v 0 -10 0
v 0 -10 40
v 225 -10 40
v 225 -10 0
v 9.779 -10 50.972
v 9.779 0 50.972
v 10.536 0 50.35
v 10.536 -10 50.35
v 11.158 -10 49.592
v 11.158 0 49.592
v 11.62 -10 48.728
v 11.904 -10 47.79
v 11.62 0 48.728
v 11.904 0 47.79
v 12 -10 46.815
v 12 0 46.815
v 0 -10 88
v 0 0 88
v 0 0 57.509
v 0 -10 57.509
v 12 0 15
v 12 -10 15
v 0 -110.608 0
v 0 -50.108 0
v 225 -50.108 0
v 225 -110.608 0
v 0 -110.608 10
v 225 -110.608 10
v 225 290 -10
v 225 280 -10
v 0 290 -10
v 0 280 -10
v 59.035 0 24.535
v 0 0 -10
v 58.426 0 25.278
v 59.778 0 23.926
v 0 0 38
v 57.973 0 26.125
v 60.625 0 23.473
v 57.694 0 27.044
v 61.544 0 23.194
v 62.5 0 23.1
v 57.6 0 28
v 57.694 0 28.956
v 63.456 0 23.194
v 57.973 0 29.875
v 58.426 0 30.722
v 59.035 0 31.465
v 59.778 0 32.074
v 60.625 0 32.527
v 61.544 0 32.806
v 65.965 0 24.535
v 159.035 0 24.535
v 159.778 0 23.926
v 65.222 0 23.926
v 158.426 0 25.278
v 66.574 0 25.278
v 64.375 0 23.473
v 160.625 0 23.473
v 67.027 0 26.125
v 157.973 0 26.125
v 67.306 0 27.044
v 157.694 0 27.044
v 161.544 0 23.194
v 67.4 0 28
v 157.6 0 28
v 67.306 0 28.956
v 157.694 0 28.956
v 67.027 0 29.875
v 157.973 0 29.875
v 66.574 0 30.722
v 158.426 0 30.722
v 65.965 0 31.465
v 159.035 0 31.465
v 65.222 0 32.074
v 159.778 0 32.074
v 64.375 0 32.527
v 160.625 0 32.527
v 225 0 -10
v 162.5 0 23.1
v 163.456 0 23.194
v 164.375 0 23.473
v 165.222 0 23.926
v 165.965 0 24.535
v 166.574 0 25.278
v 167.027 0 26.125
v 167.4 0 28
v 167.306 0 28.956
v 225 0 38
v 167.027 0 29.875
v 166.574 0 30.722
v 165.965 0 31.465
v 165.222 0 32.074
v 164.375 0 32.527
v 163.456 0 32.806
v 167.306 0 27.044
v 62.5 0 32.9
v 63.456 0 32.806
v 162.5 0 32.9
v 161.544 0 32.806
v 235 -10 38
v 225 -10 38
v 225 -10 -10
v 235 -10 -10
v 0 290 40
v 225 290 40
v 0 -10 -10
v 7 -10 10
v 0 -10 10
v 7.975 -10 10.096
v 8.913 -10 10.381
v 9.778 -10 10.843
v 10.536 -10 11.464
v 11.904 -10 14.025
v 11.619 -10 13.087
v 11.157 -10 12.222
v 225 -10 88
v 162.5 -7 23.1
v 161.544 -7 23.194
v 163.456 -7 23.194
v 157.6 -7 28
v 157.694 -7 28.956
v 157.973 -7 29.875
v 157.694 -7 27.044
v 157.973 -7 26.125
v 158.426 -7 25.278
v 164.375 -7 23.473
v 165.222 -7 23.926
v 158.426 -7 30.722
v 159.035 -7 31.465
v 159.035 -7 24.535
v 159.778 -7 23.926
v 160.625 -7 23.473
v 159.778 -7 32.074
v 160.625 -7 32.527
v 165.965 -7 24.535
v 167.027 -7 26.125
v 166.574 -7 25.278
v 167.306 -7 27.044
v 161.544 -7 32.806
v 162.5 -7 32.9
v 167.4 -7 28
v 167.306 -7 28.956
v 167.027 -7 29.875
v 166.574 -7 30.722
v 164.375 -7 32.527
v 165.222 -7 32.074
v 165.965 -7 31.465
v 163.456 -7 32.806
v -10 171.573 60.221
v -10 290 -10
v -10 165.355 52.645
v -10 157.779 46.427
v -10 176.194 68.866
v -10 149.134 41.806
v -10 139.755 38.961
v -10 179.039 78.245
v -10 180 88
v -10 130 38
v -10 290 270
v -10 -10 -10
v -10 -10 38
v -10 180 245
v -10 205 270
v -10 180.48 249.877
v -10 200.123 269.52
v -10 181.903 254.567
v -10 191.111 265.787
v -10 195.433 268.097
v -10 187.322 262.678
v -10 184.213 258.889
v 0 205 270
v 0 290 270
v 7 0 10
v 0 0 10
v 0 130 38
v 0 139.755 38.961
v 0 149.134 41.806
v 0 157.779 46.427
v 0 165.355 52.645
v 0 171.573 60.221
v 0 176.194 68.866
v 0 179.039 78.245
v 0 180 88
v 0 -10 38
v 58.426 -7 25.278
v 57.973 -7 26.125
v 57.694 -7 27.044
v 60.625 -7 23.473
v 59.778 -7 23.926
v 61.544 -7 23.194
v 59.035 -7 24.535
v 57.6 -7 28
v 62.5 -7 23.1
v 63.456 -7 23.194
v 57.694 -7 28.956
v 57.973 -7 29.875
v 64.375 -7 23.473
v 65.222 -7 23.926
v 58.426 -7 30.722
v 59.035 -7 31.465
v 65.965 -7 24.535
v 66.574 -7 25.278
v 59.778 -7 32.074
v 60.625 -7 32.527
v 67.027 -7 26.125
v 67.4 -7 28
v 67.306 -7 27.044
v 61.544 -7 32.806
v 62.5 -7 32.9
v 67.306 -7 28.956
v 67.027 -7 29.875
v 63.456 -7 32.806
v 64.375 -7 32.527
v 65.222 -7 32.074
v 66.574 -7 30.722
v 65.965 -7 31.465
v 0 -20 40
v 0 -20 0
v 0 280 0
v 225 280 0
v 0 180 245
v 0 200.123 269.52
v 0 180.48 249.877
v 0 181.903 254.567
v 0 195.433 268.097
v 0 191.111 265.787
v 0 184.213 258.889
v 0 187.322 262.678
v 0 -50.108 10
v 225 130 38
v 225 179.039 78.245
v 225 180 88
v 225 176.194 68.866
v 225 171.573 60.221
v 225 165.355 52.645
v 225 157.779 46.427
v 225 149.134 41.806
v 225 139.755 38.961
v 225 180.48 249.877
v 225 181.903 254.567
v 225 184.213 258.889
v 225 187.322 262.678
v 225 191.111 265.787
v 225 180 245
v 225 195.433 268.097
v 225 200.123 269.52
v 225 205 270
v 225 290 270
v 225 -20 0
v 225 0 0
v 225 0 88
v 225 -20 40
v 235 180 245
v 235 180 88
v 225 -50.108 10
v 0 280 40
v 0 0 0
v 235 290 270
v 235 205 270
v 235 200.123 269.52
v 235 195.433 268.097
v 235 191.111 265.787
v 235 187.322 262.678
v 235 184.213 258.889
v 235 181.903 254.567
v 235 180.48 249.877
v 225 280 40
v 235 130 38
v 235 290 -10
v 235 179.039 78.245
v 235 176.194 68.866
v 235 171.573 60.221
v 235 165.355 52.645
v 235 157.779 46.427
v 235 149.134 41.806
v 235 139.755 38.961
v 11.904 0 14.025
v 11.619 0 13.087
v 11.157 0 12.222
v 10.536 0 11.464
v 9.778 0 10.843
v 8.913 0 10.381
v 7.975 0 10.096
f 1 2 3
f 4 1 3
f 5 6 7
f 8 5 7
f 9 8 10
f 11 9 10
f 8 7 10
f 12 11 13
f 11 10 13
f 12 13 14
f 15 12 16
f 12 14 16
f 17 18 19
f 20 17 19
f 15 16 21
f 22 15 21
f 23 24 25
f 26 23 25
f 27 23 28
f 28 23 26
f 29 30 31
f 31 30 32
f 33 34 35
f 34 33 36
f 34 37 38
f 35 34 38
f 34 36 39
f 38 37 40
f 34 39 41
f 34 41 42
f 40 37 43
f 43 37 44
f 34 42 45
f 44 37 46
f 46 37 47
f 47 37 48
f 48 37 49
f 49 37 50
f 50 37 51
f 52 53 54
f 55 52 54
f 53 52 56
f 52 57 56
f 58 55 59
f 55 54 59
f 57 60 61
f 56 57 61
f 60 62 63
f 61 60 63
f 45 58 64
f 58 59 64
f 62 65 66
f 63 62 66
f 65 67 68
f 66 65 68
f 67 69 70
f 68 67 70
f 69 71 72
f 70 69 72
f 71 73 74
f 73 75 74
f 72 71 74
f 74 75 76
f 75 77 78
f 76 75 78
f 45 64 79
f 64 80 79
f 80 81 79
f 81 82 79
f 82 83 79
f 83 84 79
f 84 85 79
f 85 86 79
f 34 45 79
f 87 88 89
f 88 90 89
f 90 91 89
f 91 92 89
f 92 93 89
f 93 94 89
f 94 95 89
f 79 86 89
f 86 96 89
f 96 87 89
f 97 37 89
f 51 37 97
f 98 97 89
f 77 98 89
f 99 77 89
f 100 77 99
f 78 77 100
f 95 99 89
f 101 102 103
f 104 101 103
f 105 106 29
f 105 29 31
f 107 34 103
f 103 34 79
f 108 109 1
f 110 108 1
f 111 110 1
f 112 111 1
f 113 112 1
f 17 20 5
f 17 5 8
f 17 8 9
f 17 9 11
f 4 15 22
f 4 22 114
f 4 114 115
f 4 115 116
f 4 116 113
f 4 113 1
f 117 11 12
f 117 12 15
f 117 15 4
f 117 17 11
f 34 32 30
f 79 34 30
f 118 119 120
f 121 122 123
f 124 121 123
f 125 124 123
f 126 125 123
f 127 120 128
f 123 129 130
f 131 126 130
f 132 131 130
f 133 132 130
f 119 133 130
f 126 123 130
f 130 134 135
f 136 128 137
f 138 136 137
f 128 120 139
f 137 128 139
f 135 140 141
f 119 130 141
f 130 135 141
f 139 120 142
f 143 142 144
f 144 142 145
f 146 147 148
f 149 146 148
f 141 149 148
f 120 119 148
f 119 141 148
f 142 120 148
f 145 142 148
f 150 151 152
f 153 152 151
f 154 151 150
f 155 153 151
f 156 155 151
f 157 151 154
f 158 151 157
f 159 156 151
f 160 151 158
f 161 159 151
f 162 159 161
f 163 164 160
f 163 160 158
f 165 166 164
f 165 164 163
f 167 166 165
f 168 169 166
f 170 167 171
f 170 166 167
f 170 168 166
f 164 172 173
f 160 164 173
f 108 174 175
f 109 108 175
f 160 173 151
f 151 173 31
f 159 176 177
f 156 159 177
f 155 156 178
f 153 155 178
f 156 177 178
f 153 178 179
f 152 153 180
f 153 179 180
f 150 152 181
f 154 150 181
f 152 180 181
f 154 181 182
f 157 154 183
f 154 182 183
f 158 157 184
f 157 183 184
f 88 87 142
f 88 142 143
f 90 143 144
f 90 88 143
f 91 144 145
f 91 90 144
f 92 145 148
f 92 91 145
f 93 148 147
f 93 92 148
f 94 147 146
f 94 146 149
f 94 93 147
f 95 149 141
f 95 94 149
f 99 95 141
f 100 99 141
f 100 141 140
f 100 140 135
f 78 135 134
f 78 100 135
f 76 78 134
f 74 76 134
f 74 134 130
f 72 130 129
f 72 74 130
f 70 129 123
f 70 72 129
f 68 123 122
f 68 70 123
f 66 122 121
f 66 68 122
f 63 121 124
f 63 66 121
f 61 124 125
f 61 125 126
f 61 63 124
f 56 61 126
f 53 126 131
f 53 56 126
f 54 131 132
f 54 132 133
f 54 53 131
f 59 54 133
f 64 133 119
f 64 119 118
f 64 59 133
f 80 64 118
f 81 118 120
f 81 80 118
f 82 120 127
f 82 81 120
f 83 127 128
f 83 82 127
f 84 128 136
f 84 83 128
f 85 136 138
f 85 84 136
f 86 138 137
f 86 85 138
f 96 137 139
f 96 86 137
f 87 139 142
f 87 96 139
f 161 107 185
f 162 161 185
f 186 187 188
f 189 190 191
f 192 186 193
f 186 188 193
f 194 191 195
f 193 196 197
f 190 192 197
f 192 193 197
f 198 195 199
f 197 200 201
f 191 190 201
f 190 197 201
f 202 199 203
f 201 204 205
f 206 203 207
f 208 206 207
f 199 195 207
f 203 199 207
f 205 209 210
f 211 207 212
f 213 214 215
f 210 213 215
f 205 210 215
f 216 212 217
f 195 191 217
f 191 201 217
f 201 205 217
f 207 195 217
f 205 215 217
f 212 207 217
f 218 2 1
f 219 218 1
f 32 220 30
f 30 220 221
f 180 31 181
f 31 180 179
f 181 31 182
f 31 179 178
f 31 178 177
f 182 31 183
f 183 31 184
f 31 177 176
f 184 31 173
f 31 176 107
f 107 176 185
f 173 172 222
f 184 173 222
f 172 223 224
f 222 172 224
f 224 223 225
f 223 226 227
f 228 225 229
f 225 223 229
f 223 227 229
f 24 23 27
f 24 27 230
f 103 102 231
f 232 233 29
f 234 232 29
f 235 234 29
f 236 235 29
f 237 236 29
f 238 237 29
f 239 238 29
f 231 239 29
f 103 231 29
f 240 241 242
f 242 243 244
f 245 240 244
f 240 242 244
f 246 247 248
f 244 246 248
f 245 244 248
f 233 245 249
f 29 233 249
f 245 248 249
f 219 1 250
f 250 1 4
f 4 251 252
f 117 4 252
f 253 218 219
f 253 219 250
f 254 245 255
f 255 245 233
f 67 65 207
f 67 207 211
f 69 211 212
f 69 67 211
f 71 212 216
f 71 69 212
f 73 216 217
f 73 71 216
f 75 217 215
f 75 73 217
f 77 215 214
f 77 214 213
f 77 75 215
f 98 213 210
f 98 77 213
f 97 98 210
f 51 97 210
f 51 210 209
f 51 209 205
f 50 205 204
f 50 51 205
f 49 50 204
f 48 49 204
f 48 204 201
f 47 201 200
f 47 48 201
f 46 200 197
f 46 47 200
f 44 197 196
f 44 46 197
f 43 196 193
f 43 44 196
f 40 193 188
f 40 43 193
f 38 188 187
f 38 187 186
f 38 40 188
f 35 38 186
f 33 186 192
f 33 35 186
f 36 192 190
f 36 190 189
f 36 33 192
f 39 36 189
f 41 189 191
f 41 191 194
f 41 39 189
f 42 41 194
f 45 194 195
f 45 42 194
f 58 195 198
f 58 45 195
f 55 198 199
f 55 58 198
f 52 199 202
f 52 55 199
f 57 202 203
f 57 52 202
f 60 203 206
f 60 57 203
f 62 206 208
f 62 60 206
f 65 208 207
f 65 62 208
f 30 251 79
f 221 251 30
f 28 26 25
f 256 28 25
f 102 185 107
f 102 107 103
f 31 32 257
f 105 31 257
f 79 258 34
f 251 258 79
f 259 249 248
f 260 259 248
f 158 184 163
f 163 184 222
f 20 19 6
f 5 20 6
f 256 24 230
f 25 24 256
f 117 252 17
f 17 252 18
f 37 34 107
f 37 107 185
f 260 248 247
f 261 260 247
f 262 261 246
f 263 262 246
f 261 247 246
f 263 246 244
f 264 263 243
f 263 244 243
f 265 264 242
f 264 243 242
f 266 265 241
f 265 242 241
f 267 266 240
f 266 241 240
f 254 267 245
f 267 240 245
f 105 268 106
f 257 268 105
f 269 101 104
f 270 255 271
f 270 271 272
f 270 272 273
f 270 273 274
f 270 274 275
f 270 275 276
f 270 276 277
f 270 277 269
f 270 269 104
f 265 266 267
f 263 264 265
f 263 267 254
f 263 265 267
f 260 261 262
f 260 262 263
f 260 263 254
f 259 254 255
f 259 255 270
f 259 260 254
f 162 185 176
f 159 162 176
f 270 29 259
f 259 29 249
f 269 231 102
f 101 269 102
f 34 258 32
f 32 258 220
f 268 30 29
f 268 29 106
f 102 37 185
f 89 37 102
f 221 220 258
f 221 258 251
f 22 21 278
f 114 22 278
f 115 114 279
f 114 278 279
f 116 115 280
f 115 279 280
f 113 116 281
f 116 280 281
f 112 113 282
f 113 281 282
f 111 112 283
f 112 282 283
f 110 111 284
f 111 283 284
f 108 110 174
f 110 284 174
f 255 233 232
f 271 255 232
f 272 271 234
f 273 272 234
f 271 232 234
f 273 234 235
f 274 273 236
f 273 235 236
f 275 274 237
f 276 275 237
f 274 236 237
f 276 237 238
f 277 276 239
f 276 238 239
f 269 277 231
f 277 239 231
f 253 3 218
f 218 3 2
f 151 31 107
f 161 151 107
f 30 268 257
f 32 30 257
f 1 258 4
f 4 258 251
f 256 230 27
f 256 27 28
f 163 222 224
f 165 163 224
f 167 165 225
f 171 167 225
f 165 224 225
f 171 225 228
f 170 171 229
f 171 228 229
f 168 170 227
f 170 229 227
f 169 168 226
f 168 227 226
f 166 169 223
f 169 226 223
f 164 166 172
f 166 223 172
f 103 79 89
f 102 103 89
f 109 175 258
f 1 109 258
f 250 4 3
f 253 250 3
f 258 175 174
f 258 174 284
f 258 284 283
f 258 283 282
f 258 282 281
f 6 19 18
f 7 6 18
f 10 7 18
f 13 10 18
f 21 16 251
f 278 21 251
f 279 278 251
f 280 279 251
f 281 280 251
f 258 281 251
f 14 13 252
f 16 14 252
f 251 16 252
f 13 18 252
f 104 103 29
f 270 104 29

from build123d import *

# Parameters (mm, degrees)
F0_W      = 225
F0_H      = 280
F1_DEPTH  = 10
F2_W      = 225
F2_H      = 48
F2_R      = 4.9
F3_DEPTH  = 10
F4_DEPTH  = 7
F5_W      = 225
F5_H      = 50
F6_DEPTH  = 10
F8_W      = 280
F8_H      = 10
F10_DEPTH = 10
F7_W      = 280
F7_H      = 10
F11_DEPTH = 10
F12_DEPTH = 10
F14_DEPTH = 10
F15_W     = 225
F15_H     = 60.5
F16_DEPTH = 10


with BuildPart() as f1:
    # F0 (on Top) → F1 (new body)
    with BuildSketch(Plane.XY):
        with Locations((112.5, 140)):
            Rectangle(F0_W, F0_H)
    extrude(amount=-F1_DEPTH)


with BuildPart() as f3:
    # F2 (on face) → F3 (new body)
    with BuildSketch(Plane.XZ):
        with Locations((112.5, 14)):
            Rectangle(F2_W, F2_H)
        with Locations((62.5, 28)):
            Circle(F2_R, mode=Mode.SUBTRACT)
        with Locations((162.5, 28)):
            Circle(F2_R, mode=Mode.SUBTRACT)
        with Locations((62.5, 28)):
            Circle(F2_R)
        with Locations((162.5, 28)):
            Circle(F2_R)
    extrude(amount=F3_DEPTH)

    # F2 (on face) → F4 (cut)
    with BuildSketch(Plane.XZ):
        with Locations((62.5, 28)):
            Circle(F2_R)
        with Locations((162.5, 28)):
            Circle(F2_R)
    extrude(amount=F4_DEPTH, mode=Mode.SUBTRACT)


with BuildPart() as f6:
    # F5 (on face) → F6 (new body)
    with BuildSketch(Plane(origin=(0, 280, 0), x_dir=(-1, 0, 0), z_dir=(0, 1, 0))):
        with Locations((-112.5, 15)):
            Rectangle(F5_W, F5_H)
    extrude(amount=F6_DEPTH)


with BuildPart() as f10:
    # F8 (on face) → F10 (new body)
    with BuildSketch(Plane(origin=(0, 0, 0), x_dir=(0, -1, 0), z_dir=(-1, 0, 0))):
        with Locations((-140, -5)):
            Rectangle(F8_W, F8_H)
        with BuildLine():
            Line((0, -10), (10, -10))
            Line((10, -10), (10, 38))
            Line((10, 38), (-130, 38))
            ThreePointArc((-130, 38), (-165.3553390593, 52.6446609407), (-180, 88))
            Line((-180, 88), (-180, 245))
            ThreePointArc((-180, 245), (-187.3223304703, 262.6776695297), (-205, 270))
            Line((-205, 270), (-290, 270))
            Line((-290, 270), (-290, -10))
            Line((-290, -10), (-280, -10))
            Line((-280, -10), (-280, 0))
            Line((-280, 0), (0, 0))
            Line((0, 0), (0, -10))
        make_face()
    extrude(amount=F10_DEPTH)


with BuildPart() as f11:
    # F7 (on face) → F11 (new body)
    with BuildSketch(Plane.YZ.offset(225)):
        with BuildLine():
            Line((290, -10), (290, 270))
            Line((290, 270), (205, 270))
            ThreePointArc((205, 270), (187.3223304703, 262.6776695297), (180, 245))
            Line((180, 245), (180, 88))
            ThreePointArc((180, 88), (165.3553390593, 52.6446609407), (130, 38))
            Line((130, 38), (-10, 38))
            Line((-10, 38), (-10, -10))
            Line((-10, -10), (0, -10))
            Line((0, -10), (0, 0))
            Line((0, 0), (280, 0))
            Line((280, 0), (280, -10))
            Line((280, -10), (290, -10))
        make_face()
        with Locations((140, -5)):
            Rectangle(F7_W, F7_H)
    extrude(amount=F11_DEPTH)


with BuildPart() as f12:
    # F9 (on face) → F12 (new body)
    with BuildSketch(Plane.XZ.offset(10)):
        Polygon((0, 40), (0, 0), (220, 0), (225, 0), (225, 40), align=None)
    extrude(amount=F12_DEPTH)


with BuildPart() as f14:
    # F13 (on Front) → F14 (new body)
    with BuildSketch(Plane.XZ):
        with BuildLine():
            Line((0, 10), (0, 0))
            Line((0, 0), (225, 0))
            Line((225, 0), (225, 88))
            Line((225, 88), (0, 88))
            Line((0, 88), (0, 57.509418577))
            Line((0, 57.509418577), (9.7789325581, 50.9716644748))
            ThreePointArc((9.7789325581, 50.9716644748), (11.4099128557, 49.17144929), (12, 46.8150391804))
            Line((12, 46.8150391804), (12, 15))
            ThreePointArc((12, 15), (10.5355339059, 11.4644660941), (7, 10))
            Line((7, 10), (0, 10))
        make_face()
    extrude(amount=F14_DEPTH)


with BuildPart() as f16:
    # F15 (on Top) → F16 (new body)
    with BuildSketch(Plane.XY):
        with Locations((112.5, -80.3575800167)):
            Rectangle(F15_W, F15_H)
    extrude(amount=F16_DEPTH)


solid = Compound([f1.part, f3.part, f6.part, f10.part, f11.part, f12.part, f14.part, f16.part])
